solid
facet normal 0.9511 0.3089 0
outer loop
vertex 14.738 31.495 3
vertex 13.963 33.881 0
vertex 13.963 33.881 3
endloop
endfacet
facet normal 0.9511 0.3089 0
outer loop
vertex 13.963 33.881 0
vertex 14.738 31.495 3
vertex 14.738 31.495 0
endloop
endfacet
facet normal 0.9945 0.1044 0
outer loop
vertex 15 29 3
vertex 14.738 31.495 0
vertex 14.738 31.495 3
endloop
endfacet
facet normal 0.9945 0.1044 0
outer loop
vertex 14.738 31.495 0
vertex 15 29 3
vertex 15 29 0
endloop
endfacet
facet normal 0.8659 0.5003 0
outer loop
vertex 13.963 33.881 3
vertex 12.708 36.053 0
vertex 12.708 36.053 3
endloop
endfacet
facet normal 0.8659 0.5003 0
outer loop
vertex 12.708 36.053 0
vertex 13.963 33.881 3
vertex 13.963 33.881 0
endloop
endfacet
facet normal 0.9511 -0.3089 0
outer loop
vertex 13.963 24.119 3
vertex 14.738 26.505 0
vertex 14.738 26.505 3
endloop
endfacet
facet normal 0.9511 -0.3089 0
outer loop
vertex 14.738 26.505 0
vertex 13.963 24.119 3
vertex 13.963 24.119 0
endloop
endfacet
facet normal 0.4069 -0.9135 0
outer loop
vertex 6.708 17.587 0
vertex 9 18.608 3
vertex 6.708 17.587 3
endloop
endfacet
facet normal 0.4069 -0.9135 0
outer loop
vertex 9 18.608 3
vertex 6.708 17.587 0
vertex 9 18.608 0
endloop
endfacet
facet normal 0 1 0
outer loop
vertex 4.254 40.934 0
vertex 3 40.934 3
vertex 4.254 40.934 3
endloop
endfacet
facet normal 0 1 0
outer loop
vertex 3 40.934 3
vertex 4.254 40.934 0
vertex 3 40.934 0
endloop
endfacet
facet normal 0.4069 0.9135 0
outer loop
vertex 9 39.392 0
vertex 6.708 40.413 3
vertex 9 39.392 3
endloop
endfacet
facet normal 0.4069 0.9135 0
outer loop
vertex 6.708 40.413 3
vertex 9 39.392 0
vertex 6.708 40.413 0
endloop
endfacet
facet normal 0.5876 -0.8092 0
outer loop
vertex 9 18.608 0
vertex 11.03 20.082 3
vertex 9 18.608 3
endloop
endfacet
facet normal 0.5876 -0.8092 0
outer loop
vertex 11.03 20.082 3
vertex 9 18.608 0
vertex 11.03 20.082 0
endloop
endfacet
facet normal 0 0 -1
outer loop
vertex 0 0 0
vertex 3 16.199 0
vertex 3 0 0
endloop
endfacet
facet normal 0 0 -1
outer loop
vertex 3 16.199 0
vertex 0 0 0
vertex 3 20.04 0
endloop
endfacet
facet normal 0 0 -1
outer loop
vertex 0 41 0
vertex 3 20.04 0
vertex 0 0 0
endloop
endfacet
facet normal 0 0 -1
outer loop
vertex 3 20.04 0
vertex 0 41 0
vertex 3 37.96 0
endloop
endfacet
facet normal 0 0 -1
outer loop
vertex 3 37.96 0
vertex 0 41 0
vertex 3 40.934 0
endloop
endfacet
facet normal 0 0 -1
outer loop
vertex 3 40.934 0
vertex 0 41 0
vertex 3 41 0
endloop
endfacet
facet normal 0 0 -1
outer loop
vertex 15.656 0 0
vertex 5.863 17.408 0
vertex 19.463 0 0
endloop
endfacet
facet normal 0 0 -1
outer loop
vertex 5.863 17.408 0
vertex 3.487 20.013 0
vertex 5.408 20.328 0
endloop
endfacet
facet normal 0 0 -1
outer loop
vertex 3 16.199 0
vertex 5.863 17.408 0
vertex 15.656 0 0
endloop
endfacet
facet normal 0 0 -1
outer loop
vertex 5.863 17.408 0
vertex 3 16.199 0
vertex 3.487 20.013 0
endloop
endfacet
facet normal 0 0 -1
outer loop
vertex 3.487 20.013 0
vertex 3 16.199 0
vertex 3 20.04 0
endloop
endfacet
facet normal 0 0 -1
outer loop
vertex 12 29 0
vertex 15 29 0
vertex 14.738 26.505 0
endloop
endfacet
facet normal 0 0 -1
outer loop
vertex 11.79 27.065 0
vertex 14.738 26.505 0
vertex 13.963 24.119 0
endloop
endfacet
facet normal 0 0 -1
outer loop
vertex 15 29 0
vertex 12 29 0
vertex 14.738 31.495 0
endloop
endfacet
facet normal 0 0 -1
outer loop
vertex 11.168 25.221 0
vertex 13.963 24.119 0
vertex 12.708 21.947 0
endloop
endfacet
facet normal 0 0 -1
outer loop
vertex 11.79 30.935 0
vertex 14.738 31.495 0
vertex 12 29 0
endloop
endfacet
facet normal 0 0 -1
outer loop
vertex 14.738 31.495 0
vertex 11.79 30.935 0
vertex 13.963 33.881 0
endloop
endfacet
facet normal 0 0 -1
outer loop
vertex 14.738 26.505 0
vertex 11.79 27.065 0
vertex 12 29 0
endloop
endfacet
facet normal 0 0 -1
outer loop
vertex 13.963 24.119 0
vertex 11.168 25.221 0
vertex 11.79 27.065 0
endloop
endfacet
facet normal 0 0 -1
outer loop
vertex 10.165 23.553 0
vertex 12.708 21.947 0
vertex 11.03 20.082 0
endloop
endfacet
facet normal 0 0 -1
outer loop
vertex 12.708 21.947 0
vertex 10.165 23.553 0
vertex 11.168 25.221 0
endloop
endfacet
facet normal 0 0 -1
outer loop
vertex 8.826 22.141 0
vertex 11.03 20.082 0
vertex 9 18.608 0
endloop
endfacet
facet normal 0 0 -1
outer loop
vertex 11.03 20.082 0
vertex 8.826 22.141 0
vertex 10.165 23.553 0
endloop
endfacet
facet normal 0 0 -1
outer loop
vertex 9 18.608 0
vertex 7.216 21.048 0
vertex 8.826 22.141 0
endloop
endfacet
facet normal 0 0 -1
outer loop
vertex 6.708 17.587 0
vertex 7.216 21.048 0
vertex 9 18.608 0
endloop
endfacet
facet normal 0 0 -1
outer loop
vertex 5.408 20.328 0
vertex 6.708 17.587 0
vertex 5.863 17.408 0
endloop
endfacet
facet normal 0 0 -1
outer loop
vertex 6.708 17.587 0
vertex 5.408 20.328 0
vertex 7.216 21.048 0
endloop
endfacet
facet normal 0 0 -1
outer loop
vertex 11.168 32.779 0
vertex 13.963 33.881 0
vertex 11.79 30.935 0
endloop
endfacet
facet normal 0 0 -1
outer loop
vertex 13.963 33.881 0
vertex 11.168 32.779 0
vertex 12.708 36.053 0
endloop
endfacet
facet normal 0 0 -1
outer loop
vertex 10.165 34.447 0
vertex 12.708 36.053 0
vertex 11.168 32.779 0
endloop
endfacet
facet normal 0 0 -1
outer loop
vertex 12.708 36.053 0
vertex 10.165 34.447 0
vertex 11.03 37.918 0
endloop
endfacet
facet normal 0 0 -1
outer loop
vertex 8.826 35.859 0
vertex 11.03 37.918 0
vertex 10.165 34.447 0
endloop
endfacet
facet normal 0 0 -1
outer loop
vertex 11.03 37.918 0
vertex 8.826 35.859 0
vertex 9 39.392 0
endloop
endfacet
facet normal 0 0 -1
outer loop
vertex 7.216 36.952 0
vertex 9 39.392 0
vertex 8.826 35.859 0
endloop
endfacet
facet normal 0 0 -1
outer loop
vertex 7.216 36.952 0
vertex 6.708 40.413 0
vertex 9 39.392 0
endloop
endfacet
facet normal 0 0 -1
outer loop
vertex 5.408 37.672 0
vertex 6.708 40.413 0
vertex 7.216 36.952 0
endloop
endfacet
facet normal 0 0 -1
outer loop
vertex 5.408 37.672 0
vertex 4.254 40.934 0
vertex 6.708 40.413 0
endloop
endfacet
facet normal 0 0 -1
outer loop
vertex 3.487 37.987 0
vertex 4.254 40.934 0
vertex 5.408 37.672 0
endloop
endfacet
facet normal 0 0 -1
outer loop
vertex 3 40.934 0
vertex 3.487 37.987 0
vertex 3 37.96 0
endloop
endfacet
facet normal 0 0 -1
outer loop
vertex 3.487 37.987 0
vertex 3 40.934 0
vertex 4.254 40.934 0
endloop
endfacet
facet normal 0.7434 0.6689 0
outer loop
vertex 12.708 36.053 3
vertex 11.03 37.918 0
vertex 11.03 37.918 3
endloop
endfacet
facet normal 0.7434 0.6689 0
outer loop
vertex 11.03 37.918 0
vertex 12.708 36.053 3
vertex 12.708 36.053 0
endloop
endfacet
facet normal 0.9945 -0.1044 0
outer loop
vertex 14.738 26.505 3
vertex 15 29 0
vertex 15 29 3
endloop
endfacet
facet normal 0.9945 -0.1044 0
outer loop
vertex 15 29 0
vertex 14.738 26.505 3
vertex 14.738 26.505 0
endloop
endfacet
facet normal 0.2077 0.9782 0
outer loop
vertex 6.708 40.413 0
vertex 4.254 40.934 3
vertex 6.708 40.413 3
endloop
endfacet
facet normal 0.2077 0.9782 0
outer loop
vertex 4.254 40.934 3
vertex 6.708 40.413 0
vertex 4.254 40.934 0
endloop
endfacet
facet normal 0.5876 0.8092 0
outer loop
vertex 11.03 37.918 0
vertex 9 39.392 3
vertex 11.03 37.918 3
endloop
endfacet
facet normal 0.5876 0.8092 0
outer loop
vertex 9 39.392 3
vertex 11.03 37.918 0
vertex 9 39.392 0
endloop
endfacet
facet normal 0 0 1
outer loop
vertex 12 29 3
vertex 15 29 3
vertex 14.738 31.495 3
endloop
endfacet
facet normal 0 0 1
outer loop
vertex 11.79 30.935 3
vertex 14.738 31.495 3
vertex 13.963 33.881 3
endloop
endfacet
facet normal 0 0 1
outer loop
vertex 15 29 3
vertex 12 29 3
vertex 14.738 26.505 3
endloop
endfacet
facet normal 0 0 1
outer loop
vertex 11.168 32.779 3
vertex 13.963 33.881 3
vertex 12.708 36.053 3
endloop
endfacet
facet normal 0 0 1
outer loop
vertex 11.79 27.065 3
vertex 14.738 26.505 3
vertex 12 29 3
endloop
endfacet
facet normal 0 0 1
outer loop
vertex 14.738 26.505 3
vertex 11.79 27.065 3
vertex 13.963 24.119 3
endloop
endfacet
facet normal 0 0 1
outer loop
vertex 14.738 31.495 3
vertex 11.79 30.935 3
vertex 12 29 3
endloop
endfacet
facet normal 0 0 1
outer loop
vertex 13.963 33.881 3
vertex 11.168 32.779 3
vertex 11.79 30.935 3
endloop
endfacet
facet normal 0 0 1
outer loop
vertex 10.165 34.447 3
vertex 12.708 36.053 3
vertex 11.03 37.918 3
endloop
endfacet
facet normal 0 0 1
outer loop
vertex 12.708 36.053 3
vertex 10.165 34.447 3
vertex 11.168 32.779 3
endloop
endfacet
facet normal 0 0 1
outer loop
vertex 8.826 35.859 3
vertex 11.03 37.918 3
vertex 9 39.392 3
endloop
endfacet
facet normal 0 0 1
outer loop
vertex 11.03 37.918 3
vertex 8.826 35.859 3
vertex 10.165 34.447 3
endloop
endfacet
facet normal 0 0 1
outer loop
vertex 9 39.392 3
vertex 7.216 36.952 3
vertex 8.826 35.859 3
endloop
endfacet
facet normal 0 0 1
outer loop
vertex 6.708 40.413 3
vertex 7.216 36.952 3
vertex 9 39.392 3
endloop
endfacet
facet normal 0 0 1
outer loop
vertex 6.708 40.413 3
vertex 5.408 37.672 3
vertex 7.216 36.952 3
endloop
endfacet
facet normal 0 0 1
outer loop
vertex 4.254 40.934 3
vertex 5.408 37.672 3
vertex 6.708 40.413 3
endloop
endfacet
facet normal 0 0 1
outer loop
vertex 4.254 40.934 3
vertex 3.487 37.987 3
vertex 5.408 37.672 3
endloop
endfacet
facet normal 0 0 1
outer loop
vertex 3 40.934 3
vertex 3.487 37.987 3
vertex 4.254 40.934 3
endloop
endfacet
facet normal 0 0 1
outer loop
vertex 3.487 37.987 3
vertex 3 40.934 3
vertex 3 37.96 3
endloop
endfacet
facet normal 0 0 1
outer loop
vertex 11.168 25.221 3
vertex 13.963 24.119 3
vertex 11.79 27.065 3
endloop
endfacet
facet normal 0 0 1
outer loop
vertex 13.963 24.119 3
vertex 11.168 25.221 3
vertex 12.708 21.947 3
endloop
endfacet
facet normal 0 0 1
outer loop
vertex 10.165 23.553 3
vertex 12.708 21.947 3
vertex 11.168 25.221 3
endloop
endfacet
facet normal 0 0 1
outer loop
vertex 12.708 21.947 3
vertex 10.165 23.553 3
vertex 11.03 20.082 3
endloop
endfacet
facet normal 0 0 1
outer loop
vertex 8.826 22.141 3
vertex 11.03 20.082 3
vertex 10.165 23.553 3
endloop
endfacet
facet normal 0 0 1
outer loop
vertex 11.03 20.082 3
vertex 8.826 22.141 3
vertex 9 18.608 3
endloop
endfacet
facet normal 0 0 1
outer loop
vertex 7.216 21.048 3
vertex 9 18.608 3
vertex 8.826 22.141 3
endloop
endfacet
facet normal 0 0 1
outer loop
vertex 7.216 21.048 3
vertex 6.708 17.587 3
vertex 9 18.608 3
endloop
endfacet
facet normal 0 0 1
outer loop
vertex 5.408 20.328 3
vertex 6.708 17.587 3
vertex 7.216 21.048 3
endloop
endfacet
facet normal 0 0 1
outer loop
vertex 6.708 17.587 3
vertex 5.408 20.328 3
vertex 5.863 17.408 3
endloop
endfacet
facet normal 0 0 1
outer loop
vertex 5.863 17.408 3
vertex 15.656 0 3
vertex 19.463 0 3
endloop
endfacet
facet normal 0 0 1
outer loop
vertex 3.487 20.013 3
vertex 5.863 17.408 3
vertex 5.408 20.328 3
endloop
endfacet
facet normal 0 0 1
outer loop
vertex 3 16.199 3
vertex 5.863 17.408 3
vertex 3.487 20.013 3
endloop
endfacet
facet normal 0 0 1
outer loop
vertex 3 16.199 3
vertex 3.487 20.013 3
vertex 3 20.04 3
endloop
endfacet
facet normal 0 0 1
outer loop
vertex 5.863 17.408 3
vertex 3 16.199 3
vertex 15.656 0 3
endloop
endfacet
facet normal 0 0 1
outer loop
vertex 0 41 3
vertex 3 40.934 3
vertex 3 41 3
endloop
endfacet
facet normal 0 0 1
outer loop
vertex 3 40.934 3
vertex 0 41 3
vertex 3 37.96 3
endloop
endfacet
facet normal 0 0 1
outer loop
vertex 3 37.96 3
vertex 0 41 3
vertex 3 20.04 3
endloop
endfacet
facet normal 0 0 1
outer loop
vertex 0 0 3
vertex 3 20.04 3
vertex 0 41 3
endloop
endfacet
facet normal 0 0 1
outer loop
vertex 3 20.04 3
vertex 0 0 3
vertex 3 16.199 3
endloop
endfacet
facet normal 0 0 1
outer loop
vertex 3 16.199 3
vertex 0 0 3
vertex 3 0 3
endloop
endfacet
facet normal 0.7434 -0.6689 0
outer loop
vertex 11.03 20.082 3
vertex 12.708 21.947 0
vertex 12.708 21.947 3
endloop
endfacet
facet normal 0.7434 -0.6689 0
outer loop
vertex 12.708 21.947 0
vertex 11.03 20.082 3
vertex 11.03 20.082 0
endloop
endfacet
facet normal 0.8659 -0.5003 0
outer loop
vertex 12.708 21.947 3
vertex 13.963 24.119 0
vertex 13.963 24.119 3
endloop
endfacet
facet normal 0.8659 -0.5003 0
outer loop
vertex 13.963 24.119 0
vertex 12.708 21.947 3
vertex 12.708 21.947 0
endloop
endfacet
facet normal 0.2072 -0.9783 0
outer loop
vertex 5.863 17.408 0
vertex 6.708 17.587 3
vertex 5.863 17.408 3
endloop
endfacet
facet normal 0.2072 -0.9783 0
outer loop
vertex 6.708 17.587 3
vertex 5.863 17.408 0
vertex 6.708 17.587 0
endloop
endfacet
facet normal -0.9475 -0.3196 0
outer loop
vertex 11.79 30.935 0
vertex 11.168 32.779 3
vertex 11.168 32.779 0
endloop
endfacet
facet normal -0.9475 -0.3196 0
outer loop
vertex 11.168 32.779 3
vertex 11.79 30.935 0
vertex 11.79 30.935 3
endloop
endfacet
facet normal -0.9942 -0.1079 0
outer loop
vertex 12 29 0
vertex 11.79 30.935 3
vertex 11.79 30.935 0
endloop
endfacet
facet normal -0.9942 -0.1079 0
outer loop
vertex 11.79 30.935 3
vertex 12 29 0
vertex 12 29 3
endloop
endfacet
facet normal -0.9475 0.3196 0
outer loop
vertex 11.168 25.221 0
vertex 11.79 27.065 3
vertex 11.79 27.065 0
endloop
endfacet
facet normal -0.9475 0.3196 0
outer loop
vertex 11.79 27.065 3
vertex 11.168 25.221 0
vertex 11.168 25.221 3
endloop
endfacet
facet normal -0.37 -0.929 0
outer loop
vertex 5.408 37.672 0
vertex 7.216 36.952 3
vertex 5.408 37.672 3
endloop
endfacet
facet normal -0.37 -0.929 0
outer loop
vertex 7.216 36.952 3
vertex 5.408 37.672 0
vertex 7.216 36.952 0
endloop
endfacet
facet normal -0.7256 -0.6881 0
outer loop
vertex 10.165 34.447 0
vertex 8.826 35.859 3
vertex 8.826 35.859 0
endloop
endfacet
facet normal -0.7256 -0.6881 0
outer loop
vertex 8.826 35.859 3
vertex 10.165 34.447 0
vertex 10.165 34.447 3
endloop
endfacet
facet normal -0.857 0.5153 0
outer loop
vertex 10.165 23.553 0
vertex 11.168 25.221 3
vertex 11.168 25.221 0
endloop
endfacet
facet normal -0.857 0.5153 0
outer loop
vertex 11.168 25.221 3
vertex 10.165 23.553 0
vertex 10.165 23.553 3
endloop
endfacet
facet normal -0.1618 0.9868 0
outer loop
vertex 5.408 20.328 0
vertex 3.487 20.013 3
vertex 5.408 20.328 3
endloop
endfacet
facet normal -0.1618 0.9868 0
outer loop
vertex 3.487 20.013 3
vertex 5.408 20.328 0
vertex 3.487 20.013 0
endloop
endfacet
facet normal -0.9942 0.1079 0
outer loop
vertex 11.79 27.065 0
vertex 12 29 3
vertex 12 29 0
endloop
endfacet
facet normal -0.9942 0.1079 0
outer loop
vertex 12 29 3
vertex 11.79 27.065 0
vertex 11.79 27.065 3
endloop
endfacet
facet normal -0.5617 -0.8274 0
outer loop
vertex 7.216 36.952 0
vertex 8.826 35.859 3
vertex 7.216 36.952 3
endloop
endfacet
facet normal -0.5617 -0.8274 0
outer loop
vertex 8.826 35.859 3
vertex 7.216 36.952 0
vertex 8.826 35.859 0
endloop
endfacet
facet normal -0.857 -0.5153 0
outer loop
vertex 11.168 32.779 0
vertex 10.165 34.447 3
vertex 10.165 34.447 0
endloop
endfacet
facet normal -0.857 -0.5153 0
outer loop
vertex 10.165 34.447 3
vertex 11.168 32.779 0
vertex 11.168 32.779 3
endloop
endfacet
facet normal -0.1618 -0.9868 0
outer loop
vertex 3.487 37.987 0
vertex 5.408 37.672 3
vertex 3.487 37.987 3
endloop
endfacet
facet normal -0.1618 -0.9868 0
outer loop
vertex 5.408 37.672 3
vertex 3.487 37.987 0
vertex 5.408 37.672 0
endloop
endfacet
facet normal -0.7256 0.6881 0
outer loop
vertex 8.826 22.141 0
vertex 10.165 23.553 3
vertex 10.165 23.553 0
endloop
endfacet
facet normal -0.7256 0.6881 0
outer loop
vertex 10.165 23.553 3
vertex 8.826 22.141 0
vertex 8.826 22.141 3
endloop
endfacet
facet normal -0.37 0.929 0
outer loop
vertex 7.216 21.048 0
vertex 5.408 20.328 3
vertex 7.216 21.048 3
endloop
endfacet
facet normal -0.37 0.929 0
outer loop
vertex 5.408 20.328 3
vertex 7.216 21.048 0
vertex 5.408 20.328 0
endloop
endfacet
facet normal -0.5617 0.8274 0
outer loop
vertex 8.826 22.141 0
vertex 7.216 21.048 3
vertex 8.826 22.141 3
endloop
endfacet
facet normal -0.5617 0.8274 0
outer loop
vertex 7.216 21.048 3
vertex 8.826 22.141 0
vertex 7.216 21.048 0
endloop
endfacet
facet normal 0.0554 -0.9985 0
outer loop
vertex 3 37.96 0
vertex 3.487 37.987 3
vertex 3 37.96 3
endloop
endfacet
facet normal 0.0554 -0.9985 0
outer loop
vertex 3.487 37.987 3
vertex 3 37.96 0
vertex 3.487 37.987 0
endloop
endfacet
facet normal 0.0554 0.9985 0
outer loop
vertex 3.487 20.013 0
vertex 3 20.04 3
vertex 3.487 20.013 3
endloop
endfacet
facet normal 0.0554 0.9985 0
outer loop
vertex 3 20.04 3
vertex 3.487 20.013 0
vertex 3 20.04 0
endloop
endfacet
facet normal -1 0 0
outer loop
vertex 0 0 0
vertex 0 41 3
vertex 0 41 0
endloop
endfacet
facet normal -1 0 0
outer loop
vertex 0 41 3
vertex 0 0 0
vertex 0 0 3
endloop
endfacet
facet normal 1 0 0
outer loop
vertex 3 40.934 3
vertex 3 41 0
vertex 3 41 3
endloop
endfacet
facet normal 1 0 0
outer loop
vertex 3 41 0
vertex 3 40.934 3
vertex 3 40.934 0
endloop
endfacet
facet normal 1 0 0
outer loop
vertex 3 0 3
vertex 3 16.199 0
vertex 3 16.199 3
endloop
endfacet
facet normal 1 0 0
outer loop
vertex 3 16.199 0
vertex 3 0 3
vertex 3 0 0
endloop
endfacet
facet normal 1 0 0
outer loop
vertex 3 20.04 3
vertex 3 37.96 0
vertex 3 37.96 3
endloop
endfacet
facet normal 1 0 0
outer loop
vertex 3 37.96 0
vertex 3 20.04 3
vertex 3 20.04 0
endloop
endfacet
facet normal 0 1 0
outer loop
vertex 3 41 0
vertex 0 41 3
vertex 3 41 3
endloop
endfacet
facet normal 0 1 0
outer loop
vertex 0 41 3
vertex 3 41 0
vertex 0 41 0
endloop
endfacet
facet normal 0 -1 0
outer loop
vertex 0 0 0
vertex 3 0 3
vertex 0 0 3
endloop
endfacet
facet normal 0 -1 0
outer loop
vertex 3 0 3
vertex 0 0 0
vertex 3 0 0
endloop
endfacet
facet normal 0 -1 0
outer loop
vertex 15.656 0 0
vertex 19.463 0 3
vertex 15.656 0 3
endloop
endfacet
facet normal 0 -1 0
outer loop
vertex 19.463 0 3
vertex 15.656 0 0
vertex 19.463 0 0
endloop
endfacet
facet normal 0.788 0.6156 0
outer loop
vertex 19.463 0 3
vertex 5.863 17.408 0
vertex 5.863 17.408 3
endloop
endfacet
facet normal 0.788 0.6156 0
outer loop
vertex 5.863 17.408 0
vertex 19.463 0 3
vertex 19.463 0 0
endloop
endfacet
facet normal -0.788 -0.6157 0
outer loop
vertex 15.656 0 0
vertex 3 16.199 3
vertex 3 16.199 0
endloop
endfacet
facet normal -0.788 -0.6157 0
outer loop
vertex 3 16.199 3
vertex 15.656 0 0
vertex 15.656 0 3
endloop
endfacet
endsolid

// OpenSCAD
difference(){
  union(){
  cube([3,41,3]);
difference(){
  translate([3,29,0]) cylinder(3,12,12);
  translate([3,29,0]) cylinder(5,9,9);
  translate([-15,5,0]) cube([15,40,3]);
}
translate([18,-3,0]) rotate([0,0,38]) cube([3,26,3]);
}
  translate([0,-13,0]) cube([40,13,3]);

}
